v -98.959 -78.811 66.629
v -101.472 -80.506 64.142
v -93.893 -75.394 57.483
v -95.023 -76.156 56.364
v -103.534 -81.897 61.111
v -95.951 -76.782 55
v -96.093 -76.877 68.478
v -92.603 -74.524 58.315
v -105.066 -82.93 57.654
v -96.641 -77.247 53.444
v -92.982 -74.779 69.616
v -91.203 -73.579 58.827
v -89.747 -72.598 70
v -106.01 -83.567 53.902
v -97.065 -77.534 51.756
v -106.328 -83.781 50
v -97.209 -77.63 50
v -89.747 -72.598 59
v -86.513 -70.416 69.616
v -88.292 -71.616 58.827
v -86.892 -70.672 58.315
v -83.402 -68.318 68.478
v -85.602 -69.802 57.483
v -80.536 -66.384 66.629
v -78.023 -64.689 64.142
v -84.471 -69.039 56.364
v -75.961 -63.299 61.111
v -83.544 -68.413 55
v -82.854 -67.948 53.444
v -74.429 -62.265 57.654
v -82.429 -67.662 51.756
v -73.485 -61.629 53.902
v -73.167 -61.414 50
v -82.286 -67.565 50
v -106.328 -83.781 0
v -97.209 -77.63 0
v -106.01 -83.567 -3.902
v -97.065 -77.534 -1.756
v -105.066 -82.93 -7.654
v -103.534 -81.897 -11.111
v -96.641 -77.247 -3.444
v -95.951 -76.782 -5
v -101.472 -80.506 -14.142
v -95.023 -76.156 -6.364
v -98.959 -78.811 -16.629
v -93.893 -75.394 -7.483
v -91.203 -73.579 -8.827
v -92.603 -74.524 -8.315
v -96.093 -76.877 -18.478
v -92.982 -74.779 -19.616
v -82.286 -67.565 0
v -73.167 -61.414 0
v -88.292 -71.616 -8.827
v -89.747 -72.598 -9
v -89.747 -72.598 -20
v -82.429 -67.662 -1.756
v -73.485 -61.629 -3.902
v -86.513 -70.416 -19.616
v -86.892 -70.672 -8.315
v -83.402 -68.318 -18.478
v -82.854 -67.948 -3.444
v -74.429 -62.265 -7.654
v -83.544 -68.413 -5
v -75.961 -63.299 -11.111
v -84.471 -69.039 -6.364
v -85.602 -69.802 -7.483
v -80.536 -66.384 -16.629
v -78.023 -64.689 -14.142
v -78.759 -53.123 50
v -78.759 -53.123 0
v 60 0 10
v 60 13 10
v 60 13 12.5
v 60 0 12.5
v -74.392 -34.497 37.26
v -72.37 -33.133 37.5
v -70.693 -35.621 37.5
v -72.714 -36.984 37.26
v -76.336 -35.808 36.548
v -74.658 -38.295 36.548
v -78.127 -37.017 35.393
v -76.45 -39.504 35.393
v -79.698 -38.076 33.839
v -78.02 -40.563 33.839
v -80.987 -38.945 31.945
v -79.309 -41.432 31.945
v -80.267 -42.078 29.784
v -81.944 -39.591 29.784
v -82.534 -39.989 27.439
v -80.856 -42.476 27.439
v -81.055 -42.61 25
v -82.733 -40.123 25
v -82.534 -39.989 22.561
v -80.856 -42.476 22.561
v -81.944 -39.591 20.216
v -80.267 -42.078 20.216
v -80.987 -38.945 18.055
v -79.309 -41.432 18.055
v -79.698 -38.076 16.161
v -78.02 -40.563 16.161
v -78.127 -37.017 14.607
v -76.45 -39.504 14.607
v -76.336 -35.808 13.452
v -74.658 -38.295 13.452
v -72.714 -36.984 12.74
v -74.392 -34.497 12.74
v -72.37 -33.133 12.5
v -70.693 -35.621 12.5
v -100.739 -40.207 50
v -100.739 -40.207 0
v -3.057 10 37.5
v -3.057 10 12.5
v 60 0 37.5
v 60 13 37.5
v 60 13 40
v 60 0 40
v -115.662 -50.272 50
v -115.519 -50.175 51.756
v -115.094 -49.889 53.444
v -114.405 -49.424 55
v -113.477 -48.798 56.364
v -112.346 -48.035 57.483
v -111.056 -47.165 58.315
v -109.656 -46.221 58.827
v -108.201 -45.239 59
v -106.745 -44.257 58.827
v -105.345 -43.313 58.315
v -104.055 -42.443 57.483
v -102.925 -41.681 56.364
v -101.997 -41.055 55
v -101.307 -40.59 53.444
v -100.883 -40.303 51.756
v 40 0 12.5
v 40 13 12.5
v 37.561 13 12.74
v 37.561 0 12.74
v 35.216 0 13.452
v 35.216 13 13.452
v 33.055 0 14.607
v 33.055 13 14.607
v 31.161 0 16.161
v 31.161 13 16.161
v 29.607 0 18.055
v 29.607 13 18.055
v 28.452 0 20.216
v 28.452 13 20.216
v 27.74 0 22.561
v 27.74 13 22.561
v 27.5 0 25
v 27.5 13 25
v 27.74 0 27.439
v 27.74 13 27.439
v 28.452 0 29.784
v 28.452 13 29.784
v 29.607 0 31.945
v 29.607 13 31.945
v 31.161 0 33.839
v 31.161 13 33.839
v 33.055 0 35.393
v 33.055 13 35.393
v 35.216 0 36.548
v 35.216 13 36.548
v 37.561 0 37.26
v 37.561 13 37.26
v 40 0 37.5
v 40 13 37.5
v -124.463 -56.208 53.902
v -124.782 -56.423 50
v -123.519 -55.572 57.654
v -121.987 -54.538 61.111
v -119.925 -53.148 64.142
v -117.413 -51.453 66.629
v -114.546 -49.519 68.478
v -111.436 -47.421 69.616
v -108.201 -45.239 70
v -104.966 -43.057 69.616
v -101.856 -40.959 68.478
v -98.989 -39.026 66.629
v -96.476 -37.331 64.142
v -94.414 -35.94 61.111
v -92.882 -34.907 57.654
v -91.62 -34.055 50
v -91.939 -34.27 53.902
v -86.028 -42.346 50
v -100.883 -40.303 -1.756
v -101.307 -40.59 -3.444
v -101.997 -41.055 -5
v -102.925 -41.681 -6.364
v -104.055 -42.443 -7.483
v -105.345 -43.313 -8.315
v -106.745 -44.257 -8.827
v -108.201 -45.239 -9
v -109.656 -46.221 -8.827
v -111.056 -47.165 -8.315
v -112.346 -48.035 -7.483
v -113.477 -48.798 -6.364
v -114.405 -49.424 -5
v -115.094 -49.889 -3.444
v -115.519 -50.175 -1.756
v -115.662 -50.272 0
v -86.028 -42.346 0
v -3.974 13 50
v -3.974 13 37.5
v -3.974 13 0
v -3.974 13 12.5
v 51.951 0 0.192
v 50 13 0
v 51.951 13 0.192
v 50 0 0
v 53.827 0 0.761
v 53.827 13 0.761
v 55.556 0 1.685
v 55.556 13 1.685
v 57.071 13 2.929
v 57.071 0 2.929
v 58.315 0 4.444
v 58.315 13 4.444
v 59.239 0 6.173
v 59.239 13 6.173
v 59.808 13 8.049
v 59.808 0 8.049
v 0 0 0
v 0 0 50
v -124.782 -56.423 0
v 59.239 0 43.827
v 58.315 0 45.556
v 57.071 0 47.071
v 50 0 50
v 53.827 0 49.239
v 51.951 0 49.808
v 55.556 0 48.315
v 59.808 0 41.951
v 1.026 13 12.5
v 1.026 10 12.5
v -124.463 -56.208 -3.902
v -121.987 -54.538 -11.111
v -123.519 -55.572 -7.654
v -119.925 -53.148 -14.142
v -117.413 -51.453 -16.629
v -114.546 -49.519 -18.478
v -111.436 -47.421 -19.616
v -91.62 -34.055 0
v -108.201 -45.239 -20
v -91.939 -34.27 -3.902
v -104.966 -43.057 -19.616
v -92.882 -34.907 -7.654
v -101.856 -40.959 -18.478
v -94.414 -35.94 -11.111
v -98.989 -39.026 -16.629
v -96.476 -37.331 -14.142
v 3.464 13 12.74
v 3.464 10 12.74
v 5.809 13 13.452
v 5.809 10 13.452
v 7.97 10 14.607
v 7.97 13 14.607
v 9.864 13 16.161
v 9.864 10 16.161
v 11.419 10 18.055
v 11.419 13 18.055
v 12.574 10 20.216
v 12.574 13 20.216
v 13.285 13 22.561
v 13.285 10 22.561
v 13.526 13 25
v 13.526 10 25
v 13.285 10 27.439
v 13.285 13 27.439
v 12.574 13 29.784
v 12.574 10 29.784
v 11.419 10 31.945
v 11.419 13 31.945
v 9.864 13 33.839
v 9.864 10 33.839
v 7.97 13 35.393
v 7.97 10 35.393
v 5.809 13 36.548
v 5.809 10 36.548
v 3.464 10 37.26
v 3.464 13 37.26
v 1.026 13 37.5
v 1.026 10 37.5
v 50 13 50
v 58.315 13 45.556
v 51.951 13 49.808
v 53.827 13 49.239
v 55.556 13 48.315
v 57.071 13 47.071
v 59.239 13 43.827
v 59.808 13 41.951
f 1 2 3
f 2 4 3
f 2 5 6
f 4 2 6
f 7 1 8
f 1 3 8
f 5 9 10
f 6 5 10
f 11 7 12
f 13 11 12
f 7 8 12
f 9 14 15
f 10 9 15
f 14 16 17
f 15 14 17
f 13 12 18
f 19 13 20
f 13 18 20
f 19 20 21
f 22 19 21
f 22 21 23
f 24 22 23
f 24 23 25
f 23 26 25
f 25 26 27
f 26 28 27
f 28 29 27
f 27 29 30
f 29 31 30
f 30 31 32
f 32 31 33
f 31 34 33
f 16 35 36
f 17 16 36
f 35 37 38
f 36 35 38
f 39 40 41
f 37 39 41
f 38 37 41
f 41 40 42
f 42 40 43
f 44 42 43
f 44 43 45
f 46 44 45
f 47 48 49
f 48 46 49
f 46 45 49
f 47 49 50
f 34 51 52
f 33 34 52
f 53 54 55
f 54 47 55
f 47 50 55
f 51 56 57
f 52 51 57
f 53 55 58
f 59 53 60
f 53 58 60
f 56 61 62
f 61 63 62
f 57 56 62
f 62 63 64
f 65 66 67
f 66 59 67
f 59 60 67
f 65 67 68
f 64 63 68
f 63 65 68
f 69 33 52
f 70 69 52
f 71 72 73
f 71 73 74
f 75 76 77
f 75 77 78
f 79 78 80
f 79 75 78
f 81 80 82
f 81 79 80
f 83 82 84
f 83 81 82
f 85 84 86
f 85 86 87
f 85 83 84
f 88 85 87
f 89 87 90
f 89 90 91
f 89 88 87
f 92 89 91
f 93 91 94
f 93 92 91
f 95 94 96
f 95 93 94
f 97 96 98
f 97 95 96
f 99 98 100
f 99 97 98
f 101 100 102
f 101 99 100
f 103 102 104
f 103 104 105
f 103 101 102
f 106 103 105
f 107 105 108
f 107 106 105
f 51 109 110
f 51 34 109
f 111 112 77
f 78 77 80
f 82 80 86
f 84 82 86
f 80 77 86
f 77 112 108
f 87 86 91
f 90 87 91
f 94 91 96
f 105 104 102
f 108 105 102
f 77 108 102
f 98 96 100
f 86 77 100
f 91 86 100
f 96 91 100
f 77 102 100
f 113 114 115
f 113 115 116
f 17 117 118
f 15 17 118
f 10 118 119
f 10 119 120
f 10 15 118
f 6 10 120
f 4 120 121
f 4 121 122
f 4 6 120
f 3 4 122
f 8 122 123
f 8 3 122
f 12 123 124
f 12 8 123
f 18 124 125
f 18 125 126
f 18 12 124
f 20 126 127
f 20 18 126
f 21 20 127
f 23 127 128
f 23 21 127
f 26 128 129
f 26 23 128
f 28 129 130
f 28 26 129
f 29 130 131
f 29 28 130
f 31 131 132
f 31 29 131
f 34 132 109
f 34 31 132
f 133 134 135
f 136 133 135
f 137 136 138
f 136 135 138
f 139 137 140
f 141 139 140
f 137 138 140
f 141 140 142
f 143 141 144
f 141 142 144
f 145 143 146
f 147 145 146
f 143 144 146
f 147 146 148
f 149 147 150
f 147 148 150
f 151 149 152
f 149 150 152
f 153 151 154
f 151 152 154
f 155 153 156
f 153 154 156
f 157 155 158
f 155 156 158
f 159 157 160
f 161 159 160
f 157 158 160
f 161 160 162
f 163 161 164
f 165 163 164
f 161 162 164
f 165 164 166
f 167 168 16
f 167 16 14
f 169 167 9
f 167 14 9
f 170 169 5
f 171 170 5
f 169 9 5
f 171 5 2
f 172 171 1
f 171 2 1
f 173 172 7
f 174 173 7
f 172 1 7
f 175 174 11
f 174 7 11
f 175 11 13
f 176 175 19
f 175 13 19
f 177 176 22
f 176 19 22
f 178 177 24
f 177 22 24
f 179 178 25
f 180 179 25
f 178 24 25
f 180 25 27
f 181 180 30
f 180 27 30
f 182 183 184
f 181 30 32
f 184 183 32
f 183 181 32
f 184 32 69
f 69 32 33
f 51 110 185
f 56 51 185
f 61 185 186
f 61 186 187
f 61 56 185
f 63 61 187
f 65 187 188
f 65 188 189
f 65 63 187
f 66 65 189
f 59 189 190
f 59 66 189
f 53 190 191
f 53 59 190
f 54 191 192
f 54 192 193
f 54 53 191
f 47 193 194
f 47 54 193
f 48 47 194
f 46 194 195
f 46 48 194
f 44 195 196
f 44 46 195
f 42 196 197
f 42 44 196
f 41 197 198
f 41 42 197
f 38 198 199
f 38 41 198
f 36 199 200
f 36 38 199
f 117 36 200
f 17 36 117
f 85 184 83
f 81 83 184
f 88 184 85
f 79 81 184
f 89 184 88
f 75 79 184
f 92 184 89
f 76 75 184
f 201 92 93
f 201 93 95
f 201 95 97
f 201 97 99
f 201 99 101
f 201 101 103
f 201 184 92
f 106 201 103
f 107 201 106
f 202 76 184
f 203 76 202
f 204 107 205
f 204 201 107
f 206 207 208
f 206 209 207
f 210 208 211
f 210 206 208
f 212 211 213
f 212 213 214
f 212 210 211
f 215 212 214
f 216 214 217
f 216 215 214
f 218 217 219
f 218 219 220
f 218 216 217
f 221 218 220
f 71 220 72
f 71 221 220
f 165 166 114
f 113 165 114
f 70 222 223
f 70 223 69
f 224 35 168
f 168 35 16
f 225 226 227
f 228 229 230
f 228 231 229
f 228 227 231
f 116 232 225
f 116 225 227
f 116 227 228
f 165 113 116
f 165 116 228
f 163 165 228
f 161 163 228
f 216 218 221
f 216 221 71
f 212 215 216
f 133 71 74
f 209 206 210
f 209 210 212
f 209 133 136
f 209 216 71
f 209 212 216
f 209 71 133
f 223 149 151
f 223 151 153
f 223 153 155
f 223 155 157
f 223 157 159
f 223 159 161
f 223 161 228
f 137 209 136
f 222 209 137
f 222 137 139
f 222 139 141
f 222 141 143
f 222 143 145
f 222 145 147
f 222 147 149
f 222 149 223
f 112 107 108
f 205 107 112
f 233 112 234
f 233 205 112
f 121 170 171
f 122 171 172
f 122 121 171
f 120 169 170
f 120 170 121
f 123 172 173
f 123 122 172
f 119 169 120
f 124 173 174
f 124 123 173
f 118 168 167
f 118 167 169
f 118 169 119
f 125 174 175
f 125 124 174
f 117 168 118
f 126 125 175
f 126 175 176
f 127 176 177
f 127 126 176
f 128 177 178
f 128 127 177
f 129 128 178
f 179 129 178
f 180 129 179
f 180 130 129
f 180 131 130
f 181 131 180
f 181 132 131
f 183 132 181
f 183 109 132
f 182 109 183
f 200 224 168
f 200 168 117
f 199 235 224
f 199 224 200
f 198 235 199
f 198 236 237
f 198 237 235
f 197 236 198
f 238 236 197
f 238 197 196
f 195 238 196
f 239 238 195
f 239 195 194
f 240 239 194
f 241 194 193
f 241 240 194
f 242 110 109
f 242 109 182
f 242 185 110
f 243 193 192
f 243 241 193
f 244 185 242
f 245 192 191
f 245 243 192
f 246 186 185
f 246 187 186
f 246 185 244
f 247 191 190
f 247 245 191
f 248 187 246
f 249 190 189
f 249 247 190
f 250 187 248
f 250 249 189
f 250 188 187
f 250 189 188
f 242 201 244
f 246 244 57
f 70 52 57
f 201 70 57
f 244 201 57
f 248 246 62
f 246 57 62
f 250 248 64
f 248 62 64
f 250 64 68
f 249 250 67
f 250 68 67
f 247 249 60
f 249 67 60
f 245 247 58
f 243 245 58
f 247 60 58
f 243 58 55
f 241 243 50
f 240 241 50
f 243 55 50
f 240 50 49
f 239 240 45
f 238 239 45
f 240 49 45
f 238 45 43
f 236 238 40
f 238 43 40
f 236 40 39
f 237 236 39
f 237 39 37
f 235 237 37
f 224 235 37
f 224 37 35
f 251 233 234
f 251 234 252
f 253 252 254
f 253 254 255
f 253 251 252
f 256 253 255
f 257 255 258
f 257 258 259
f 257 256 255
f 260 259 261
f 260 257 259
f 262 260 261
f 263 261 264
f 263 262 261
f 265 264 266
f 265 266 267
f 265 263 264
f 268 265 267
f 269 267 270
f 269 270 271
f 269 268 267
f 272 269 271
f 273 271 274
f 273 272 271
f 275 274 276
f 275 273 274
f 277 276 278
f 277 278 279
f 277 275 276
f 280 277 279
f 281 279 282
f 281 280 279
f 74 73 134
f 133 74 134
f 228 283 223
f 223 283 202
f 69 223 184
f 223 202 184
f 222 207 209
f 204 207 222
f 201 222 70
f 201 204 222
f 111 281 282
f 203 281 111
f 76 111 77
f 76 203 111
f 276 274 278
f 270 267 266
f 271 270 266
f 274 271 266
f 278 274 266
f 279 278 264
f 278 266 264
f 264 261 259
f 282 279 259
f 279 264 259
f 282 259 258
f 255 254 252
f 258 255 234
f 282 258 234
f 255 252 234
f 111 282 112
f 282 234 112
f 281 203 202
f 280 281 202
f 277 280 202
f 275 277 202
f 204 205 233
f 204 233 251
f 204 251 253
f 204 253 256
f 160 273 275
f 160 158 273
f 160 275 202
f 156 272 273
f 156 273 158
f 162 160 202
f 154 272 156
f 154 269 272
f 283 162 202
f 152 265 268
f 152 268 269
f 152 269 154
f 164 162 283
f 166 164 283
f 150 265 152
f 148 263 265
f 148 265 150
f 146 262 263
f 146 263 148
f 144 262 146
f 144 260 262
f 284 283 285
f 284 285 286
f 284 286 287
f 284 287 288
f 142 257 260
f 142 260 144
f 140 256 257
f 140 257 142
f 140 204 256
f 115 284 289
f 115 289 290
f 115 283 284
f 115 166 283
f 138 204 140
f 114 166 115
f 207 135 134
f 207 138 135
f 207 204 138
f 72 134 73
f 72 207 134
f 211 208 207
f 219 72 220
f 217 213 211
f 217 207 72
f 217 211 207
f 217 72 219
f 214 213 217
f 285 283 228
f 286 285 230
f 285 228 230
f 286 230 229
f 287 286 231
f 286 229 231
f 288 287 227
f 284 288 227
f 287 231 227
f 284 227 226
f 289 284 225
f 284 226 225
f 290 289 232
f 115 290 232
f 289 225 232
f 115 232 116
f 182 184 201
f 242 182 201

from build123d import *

# Parameters (mm, degrees)
BOSS_EXTRUDE1_DEPTH = 50
BOSS_EXTRUDE2_DEPTH = 16.5
CUT_EXTRUDE1_DEPTH  = 16.5
CUT_EXTRUDE3_DEPTH  = 173.734095702
CUT_EXTRUDE4_DEPTH  = 3
CUT_EXTRUDE5_DEPTH  = 3
FILLET1_R           = 10


with BuildPart() as part:
    # Sketch1 → Boss-Extrude1 (new body)
    with BuildSketch(Plane.XY):
        Polygon((60, 0), (0, 0), (-95.339320844, -64.307183899), (-102.608828589, -53.529695456), (-3.974498859, 13), (60, 13), align=None)
    extrude(amount=BOSS_EXTRUDE1_DEPTH)

    # Sketch3 → Boss-Extrude2 (add, symmetric)
    with BuildSketch(Plane(origin=(-3.634753873, 5.388744222, 0), x_dir=(-0.8290375725550407, -0.5591929034707483, 0), z_dir=(0.5591929034707483, -0.8290375725550407, 0))):
        with BuildLine():
            Line((135, 0), (135, -50))
            ThreePointArc((135, -50), (115, -70), (95, -50))
            Line((95, -50), (95, 0))
            ThreePointArc((95, 0), (115, 20), (135, 0))
        make_face()
        with BuildLine():
            Line((106, -50), (106, 0))
            ThreePointArc((106, 0), (115, 9), (124, 0))
            Line((124, 0), (124, -50))
            ThreePointArc((124, -50), (115, -59), (106, -50))
        make_face(mode=Mode.SUBTRACT)
    extrude(amount=BOSS_EXTRUDE2_DEPTH, both=True)

    # Sketch3<2> → Cut-Extrude1 (cut, symmetric)
    with BuildSketch(Plane(origin=(-3.634753873, 5.388744222, 0), x_dir=(-0.8290375725550407, -0.5591929034707483, 0), z_dir=(0.5591929034707483, -0.8290375725550407, 0))):
        with BuildLine():
            Line((106, -50), (106, 0))
            ThreePointArc((106, 0), (115, 9), (124, 0))
            Line((124, 0), (124, -50))
            ThreePointArc((124, -50), (115, -59), (106, -50))
        make_face()
    extrude(amount=CUT_EXTRUDE1_DEPTH, both=True, mode=Mode.SUBTRACT)

    # Sketch5 → Cut-Extrude3 (cut, through all)
    with BuildSketch(Plane(origin=(0, 13, 0), x_dir=(1, 0, 0), z_dir=(0, 1, 0))):
        with BuildLine():
            Line((40, -37.5), (60, -37.5))
            Line((60, -37.5), (60, -12.5))
            Line((60, -12.5), (40, -12.5))
            ThreePointArc((40, -12.5), (27.5, -25), (40, -37.5))
        make_face()
    extrude(amount=-CUT_EXTRUDE3_DEPTH, mode=Mode.SUBTRACT)

    # Sketch5<3> → Cut-Extrude4 (cut)
    with BuildSketch(Plane(origin=(0, 13, 0), x_dir=(1, 0, 0), z_dir=(0, 1, 0))):
        with BuildLine():
            Line((60, -37.5), (40, -37.5))
            ThreePointArc((40, -37.5), (27.5, -25), (40, -12.5))
            Line((40, -12.5), (60, -12.5))
            ThreePointArc((60, -12.5), (72.5, -25), (60, -37.5))
        make_face()
        with BuildLine():
            Line((-3.974498859, -12.5), (1.025501141, -12.5))
            ThreePointArc((1.025501141, -12.5), (13.525501141, -25), (1.025501141, -37.5))
            Line((1.025501141, -37.5), (-3.974498859, -37.5))
            ThreePointArc((-3.974498859, -37.5), (-16.474498859, -25), (-3.974498859, -12.5))
        make_face()
    extrude(amount=-CUT_EXTRUDE4_DEPTH, mode=Mode.SUBTRACT)

    # Sketch6 → Cut-Extrude5 (cut)
    with BuildSketch(Plane(origin=(-7.269507745, 10.777488443, 0), x_dir=(0.8290375725550407, 0.5591929034707483, 0), z_dir=(-0.5591929034707483, 0.8290375725550407, 0))):
        with BuildLine():
            Line((-78.525501141, -12.5), (3.974498859, -12.5))
            ThreePointArc((3.974498859, -12.5), (16.474498859, -25), (3.974498859, -37.5))
            Line((3.974498859, -37.5), (-78.525501141, -37.5))
            ThreePointArc((-78.525501141, -37.5), (-91.025501141, -25), (-78.525501141, -12.5))
        make_face()
    extrude(amount=-CUT_EXTRUDE5_DEPTH, mode=Mode.SUBTRACT)

    # Fillet1
    fillet1_edges = [part.edges().sort_by_distance(p)[0] for p in [
        (60, 6.5, 50),
        (60, 6.5, 0),
    ]]
    fillet(fillet1_edges, radius=FILLET1_R)


solid = part.part
